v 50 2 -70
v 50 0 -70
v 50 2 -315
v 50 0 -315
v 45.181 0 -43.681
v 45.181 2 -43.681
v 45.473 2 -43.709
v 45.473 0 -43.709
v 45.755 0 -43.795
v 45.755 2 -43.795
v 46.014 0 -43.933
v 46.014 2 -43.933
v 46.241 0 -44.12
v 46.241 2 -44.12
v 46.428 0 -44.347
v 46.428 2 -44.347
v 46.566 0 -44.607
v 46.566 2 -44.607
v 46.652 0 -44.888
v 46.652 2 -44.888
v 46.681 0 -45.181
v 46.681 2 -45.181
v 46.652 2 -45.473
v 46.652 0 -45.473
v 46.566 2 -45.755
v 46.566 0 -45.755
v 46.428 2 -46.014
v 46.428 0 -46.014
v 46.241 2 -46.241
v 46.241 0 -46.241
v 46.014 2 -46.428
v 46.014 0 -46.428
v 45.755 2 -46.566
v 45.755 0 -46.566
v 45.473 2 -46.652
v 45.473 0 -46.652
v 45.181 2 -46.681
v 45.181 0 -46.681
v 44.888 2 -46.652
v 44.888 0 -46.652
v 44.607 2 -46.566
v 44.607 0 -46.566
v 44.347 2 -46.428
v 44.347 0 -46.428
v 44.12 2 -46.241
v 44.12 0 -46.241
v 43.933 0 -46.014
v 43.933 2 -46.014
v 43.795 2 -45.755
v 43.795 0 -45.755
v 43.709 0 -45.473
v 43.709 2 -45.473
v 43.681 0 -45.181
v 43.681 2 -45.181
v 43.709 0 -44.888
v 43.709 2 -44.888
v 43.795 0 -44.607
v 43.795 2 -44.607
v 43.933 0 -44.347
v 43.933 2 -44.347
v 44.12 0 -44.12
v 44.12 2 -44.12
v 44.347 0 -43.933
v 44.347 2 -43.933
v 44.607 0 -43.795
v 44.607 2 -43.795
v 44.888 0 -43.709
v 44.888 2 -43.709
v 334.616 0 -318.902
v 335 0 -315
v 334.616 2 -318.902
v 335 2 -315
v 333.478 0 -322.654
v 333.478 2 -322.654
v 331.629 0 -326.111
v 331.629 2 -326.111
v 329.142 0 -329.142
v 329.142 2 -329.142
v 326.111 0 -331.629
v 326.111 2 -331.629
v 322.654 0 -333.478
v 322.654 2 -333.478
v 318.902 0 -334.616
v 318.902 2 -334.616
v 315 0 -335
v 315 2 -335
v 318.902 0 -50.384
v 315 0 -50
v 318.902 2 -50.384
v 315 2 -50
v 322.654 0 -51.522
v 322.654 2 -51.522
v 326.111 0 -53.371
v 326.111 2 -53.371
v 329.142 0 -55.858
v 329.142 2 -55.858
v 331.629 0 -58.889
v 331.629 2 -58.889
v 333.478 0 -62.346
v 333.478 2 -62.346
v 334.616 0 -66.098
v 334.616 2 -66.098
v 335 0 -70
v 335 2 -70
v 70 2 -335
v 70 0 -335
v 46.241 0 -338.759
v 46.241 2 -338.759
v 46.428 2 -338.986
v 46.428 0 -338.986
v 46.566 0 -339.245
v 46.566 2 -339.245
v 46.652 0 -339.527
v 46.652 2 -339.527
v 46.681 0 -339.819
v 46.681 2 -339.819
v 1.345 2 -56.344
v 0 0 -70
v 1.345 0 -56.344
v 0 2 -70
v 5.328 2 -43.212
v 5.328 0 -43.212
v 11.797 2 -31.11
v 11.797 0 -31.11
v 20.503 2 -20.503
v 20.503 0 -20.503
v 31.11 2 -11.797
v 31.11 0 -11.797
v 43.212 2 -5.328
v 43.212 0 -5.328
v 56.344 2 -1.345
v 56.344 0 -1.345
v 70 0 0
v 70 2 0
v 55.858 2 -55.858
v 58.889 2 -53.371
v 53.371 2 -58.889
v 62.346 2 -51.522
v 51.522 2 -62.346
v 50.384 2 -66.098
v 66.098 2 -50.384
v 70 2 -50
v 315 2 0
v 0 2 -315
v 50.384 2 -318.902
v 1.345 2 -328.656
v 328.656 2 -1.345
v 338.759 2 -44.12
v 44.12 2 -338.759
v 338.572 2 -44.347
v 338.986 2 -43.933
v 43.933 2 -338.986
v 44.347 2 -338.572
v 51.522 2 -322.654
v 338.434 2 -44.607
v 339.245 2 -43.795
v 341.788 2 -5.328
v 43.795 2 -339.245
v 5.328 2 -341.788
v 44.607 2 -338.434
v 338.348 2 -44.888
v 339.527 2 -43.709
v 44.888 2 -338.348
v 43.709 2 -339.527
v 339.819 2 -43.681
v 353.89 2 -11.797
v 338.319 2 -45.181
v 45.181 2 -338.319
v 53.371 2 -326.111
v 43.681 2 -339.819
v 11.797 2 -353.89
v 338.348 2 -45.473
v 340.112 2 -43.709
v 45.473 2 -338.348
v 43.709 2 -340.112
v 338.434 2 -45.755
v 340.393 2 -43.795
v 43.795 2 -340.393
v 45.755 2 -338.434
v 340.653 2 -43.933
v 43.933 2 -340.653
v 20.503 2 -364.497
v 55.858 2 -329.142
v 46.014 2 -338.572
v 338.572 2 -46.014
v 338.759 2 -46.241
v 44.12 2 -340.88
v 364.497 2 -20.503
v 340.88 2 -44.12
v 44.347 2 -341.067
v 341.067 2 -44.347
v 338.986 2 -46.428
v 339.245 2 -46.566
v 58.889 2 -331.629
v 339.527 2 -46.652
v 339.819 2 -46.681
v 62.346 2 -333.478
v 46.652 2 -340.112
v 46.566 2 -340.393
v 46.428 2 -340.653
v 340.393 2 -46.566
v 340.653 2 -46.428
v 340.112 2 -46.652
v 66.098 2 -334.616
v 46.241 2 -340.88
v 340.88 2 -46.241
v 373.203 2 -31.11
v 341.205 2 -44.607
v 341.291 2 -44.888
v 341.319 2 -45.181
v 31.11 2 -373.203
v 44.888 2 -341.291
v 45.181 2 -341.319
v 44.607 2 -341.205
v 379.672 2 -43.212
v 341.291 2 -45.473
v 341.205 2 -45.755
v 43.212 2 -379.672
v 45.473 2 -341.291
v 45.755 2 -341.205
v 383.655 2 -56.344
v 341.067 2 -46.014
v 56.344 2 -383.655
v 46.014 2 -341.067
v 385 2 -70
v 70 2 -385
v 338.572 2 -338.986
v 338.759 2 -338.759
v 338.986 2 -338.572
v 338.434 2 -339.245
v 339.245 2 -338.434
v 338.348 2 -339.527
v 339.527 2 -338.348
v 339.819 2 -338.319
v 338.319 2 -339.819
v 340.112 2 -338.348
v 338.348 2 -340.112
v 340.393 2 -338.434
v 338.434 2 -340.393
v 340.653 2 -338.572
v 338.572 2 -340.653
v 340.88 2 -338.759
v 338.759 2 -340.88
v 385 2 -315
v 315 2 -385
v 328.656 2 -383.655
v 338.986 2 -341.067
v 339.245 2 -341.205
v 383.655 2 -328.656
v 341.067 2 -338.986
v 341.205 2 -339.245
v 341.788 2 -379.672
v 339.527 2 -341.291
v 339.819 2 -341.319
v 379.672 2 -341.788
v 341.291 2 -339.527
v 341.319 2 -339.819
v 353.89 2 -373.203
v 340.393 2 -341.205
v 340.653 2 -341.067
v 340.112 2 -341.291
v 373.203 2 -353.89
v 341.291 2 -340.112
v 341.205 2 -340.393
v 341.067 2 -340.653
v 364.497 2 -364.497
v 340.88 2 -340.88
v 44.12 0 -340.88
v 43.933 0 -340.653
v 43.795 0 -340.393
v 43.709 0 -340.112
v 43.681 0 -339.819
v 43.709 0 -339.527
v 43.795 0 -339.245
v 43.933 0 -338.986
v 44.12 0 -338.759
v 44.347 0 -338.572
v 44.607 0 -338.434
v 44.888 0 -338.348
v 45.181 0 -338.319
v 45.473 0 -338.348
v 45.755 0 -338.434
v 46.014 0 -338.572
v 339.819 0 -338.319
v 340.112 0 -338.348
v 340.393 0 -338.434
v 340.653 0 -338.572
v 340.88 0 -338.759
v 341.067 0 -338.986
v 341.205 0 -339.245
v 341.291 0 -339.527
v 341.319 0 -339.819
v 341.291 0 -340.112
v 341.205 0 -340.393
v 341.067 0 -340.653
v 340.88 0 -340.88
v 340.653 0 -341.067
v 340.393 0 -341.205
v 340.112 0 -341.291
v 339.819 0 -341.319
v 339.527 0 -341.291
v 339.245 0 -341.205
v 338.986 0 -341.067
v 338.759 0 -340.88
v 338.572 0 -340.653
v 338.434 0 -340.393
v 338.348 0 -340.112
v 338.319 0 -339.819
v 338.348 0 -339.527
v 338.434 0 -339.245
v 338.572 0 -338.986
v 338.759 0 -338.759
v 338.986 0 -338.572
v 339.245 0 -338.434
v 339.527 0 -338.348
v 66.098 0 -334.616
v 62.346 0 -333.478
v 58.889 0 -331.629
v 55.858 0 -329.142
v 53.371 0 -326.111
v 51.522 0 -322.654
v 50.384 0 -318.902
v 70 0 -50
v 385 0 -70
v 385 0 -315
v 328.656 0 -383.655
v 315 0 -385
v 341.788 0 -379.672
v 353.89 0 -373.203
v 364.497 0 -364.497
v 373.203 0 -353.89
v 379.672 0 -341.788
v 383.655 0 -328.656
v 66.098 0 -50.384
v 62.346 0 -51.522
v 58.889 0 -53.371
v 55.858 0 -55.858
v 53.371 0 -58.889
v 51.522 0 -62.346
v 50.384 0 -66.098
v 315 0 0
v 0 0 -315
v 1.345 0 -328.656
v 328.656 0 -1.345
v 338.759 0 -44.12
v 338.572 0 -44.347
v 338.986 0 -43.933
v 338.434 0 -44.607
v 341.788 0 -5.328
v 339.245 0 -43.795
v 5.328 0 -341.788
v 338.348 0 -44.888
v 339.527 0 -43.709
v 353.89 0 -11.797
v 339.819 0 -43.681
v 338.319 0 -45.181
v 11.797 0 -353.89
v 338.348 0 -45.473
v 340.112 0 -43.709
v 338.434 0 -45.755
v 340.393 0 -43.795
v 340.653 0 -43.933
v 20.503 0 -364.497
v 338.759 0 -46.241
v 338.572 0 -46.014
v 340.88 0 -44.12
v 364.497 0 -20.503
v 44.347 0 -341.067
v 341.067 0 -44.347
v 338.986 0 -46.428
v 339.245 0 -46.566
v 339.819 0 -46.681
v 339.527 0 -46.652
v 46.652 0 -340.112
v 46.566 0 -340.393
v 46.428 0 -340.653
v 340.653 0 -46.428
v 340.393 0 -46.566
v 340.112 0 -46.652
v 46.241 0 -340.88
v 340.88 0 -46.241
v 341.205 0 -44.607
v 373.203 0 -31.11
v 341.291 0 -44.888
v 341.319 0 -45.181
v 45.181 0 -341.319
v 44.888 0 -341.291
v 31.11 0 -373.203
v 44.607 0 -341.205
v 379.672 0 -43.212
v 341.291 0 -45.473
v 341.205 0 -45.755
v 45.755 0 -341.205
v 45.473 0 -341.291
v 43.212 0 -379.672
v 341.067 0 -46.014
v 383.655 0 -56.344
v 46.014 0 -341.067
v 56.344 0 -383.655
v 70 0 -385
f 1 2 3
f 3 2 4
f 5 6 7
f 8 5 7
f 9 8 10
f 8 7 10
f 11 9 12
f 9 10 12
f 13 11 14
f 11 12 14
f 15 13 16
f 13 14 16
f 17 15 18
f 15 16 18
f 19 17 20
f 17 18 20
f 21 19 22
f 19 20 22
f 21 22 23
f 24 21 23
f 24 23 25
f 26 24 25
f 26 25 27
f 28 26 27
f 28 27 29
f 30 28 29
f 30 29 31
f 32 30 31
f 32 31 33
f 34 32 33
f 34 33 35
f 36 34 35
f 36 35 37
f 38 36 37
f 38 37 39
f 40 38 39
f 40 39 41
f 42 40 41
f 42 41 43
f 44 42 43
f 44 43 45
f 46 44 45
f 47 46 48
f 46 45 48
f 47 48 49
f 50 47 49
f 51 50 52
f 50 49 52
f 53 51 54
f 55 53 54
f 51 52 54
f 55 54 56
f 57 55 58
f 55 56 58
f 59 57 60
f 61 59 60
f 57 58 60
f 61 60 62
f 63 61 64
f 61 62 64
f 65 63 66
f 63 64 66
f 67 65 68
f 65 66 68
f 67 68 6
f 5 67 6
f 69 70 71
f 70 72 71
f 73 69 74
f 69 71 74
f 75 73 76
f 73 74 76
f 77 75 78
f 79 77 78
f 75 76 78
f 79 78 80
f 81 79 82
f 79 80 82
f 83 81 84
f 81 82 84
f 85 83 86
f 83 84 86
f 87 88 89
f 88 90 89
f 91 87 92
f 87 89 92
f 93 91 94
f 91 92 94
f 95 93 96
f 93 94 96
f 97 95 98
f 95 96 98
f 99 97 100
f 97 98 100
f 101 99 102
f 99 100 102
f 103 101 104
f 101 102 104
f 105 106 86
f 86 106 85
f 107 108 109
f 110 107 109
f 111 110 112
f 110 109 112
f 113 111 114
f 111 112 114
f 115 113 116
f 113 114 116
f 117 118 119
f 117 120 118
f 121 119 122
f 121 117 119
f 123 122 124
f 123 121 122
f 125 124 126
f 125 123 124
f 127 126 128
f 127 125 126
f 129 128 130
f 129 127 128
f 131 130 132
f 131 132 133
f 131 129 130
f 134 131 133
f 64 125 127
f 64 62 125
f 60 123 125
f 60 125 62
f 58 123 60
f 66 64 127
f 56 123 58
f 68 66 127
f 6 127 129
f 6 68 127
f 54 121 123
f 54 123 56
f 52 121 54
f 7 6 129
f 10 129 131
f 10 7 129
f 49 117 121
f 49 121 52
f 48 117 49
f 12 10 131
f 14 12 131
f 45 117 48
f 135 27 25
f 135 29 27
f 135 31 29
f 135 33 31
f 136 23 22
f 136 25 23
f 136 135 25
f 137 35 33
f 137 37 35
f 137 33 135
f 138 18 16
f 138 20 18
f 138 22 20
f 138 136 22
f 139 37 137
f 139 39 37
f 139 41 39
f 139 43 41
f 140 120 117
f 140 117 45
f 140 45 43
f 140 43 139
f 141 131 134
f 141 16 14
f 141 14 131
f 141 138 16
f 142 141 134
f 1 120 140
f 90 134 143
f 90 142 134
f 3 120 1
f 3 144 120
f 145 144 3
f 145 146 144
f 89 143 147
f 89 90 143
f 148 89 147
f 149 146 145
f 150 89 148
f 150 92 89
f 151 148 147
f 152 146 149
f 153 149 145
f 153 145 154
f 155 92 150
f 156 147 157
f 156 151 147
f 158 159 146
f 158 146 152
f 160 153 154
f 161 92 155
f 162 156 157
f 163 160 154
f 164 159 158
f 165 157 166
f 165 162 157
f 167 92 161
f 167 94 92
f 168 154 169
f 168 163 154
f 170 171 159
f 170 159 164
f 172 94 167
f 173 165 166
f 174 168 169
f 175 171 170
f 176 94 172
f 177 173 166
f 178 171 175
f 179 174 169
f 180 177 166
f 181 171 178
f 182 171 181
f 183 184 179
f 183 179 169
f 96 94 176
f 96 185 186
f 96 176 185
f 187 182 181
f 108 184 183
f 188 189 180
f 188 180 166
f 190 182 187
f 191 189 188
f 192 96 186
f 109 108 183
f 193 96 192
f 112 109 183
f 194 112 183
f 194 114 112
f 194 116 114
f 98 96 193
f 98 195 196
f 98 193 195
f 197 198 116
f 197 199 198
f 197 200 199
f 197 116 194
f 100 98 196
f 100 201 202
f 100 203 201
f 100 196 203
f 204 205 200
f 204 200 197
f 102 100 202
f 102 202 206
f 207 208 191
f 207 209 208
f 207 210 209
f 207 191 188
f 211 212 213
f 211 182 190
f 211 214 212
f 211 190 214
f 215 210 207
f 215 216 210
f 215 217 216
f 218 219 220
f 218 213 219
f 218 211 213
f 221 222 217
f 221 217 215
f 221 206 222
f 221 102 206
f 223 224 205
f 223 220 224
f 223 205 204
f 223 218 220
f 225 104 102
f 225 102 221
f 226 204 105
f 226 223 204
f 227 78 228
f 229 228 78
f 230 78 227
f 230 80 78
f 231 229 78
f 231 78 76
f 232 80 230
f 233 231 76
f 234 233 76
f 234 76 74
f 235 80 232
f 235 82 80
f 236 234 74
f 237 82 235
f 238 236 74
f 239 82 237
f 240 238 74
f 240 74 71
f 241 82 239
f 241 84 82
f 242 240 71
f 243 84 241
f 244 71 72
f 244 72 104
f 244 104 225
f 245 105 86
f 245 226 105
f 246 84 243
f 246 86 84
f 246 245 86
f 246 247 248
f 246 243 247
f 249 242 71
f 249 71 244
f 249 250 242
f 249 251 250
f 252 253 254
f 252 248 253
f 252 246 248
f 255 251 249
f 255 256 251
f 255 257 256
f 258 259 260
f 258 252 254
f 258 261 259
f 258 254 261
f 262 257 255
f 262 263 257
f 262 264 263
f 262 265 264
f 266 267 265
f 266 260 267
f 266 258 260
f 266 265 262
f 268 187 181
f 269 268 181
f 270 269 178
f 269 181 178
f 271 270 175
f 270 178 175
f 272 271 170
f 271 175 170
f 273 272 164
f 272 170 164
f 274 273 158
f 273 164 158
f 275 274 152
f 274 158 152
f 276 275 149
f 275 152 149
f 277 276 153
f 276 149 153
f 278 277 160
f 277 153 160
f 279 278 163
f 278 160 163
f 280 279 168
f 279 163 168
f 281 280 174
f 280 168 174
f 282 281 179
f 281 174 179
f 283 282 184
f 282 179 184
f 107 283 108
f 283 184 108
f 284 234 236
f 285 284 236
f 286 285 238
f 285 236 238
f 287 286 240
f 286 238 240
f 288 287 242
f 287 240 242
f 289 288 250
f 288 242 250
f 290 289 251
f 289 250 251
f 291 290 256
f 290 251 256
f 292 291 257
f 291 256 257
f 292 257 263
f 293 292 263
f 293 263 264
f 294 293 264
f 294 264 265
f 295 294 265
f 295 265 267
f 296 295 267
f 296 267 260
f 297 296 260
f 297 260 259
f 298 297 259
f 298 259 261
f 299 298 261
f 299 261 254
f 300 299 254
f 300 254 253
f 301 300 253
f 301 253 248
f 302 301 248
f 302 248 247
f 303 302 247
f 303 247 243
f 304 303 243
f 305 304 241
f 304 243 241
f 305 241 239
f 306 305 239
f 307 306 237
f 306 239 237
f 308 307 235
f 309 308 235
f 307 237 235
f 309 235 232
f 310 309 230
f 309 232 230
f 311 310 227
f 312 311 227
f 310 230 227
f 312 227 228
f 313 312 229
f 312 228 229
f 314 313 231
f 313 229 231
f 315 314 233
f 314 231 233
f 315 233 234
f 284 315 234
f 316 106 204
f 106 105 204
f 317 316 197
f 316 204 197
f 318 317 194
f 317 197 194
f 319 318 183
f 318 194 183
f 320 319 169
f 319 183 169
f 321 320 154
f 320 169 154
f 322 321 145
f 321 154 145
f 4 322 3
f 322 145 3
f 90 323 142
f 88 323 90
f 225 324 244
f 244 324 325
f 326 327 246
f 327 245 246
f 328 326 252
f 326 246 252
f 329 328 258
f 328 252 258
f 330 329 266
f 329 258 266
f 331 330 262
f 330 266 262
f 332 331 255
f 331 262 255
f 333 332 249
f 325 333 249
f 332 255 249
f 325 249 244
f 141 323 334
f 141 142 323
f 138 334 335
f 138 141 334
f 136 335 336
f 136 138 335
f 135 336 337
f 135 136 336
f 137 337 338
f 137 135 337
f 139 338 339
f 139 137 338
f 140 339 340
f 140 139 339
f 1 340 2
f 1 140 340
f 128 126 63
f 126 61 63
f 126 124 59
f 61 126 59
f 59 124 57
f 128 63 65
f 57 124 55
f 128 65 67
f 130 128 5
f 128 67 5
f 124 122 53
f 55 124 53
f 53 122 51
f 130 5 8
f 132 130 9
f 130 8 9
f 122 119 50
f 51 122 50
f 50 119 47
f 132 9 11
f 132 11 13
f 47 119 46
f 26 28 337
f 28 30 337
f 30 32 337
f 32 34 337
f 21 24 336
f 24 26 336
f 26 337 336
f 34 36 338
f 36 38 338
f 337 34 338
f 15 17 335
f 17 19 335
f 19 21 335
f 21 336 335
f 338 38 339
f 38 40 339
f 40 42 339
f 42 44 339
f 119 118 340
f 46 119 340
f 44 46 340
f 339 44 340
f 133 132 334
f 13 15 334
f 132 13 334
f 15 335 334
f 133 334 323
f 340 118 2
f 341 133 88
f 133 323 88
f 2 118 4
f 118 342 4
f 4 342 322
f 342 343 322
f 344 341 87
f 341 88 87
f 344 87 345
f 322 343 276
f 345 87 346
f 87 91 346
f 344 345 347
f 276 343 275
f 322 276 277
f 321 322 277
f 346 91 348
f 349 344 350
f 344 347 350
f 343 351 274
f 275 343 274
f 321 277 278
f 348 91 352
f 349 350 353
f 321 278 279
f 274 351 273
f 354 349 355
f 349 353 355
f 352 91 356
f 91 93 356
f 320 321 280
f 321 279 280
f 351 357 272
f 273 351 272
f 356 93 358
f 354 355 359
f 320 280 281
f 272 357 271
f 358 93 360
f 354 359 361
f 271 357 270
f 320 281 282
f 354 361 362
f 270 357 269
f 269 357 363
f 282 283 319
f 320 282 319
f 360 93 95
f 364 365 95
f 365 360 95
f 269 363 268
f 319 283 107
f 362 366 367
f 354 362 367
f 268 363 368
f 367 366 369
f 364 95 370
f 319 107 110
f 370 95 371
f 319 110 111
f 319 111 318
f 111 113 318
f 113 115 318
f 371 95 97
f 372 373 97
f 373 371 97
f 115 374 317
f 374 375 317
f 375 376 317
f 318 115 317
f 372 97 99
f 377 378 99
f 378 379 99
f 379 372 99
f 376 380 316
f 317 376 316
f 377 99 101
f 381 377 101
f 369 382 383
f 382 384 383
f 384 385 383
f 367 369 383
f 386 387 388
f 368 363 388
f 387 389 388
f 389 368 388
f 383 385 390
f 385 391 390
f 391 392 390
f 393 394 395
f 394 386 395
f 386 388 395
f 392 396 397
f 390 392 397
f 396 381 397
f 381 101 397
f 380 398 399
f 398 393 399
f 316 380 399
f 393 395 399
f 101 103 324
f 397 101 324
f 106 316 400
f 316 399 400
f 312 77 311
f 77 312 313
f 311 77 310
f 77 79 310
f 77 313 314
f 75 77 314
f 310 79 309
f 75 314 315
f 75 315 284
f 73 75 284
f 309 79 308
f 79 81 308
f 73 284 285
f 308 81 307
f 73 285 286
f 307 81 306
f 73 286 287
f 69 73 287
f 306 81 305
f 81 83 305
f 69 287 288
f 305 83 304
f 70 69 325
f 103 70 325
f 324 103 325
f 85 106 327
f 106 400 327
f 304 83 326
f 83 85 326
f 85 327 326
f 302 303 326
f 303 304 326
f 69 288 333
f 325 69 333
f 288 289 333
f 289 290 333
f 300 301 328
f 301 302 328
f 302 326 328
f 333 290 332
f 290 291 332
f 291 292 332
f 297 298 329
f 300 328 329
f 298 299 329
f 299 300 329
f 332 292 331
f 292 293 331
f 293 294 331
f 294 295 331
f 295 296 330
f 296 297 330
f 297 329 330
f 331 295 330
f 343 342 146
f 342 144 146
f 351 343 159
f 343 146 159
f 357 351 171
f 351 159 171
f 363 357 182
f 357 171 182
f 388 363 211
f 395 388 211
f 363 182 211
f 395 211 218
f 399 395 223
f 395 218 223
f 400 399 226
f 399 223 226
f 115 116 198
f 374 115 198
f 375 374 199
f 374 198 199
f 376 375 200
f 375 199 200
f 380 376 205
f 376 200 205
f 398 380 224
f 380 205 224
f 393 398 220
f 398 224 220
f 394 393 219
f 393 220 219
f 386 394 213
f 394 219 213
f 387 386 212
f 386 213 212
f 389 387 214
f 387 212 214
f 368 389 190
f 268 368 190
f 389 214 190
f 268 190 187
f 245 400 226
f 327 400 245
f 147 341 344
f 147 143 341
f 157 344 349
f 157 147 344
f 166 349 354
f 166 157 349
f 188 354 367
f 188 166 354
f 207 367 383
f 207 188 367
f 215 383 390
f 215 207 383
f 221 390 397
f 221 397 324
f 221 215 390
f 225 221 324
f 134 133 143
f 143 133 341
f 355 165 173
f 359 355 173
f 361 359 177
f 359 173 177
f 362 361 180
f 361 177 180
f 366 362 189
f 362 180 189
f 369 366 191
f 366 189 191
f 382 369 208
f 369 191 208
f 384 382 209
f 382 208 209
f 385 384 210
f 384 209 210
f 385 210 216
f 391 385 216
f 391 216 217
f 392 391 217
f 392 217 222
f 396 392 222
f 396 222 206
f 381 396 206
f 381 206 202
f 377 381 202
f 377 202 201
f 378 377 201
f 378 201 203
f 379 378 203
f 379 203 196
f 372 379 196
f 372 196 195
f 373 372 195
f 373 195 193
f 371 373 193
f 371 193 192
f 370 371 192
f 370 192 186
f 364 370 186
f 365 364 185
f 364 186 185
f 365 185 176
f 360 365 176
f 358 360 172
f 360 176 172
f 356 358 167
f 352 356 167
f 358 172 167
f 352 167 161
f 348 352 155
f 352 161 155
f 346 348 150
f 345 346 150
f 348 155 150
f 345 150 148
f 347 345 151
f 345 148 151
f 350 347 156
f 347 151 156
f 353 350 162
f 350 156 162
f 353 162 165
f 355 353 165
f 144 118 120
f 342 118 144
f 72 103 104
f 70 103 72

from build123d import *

# Parameters (mm, degrees)
SKETCH_1_W          = 385
SKETCH_1_H          = 385
SKETCH_1_W_2        = 285
SKETCH_1_H_2        = 285
EXTRUDE_1_DEPTH     = 2
FILLET_1_R          = 70
FILLET_2_R          = 20
CUT_EXTRUDE_1_REACH = 546.476
SKETCH_2_R          = 1.5


with BuildPart() as part:
    # 草图1 → 凸台-拉伸1 (new body)
    with BuildSketch(Plane(origin=(0, 0, 0), x_dir=(1, 0, 0), z_dir=(0, 1, 0))):
        with Locations((192.5, 192.5)):
            Rectangle(SKETCH_1_W, SKETCH_1_H)
        with Locations((192.5, 192.5)):
            Rectangle(SKETCH_1_W_2, SKETCH_1_H_2, mode=Mode.SUBTRACT)
    extrude(amount=EXTRUDE_1_DEPTH)

    # 圆角1
    fillet_1_edges = [part.edges().sort_by_distance(p)[0] for p in [
        (0, 1, -385),
        (385, 1, -385),
        (385, 1, 0),
        (0, 1, 0),
    ]]
    fillet(fillet_1_edges, radius=FILLET_1_R)

    # 圆角2
    fillet_2_edges = [part.edges().sort_by_distance(p)[0] for p in [
        (50, 1, -335),
        (50, 1, -50),
        (335, 1, -50),
        (335, 1, -335),
    ]]
    fillet(fillet_2_edges, radius=FILLET_2_R)

    # 草图2 → 切除-拉伸1 (cut, up to next)
    with BuildSketch(Plane(origin=(0, 2, 0), x_dir=(1, 0, 0), z_dir=(0, 1, 0)), mode=Mode.PRIVATE) as cut_extrude_1_sk1:
        with Locations(Location((45.18055198, 45.18055198, 0), (0, 0, 270))):
            Circle(SKETCH_2_R)
    cut_extrude_1_tool1 = extrude(cut_extrude_1_sk1.sketch, amount=-CUT_EXTRUDE_1_REACH, mode=Mode.PRIVATE) & part.part
    # 草图2 → 切除-拉伸1 (cut, up to next)
    with BuildSketch(Plane(origin=(0, 2, 0), x_dir=(1, 0, 0), z_dir=(0, 1, 0)), mode=Mode.PRIVATE) as cut_extrude_1_sk2:
        with BuildLine():
            ThreePointArc((46.68055198, 339.81944802), (45.754577129, 341.205267318), (44.119891809, 340.880108191))
            Line((44.119891809, 340.880108191), (46.241212152, 338.758787848))
            ThreePointArc((46.241212152, 338.758787848), (46.566371279, 339.245422871), (46.68055198, 339.81944802))
        make_face()
    cut_extrude_1_tool2 = extrude(cut_extrude_1_sk2.sketch, amount=-CUT_EXTRUDE_1_REACH, mode=Mode.PRIVATE) & part.part
    # 草图2 → 切除-拉伸1 (cut, up to next)
    with BuildSketch(Plane(origin=(0, 2, 0), x_dir=(1, 0, 0), z_dir=(0, 1, 0)), mode=Mode.PRIVATE) as cut_extrude_1_sk3:
        with BuildLine():
            Line((46.241212152, 338.758787848), (44.119891809, 340.880108191))
            ThreePointArc((44.119891809, 340.880108191), (44.119891809, 338.758787848), (46.241212152, 338.758787848))
        make_face()
    cut_extrude_1_tool3 = extrude(cut_extrude_1_sk3.sketch, amount=-CUT_EXTRUDE_1_REACH, mode=Mode.PRIVATE) & part.part
    # 草图2 → 切除-拉伸1 (cut, up to next)
    with BuildSketch(Plane(origin=(0, 2, 0), x_dir=(1, 0, 0), z_dir=(0, 1, 0)), mode=Mode.PRIVATE) as cut_extrude_1_sk4:
        with BuildLine():
            ThreePointArc((46.68055198, 339.81944802), (45.754577129, 341.205267318), (44.119891809, 340.880108191))
            Line((44.119891809, 340.880108191), (46.241212152, 338.758787848))
            ThreePointArc((46.241212152, 338.758787848), (46.566371279, 339.245422871), (46.68055198, 339.81944802))
        make_face()
    cut_extrude_1_tool4 = extrude(cut_extrude_1_sk4.sketch, amount=-CUT_EXTRUDE_1_REACH, mode=Mode.PRIVATE) & part.part
    # 草图2 → 切除-拉伸1 (cut, up to next)
    with BuildSketch(Plane(origin=(0, 2, 0), x_dir=(1, 0, 0), z_dir=(0, 1, 0)), mode=Mode.PRIVATE) as cut_extrude_1_sk5:
        with BuildLine():
            Line((46.241212152, 338.758787848), (44.119891809, 340.880108191))
            ThreePointArc((44.119891809, 340.880108191), (44.119891809, 338.758787848), (46.241212152, 338.758787848))
        make_face()
    cut_extrude_1_tool5 = extrude(cut_extrude_1_sk5.sketch, amount=-CUT_EXTRUDE_1_REACH, mode=Mode.PRIVATE) & part.part
    # 草图2 → 切除-拉伸1 (cut, up to next)
    with BuildSketch(Plane(origin=(0, 2, 0), x_dir=(1, 0, 0), z_dir=(0, 1, 0)), mode=Mode.PRIVATE) as cut_extrude_1_sk6:
        with Locations(Location((339.81944802, 339.81944802, 0), (0, 0, 270))):
            Circle(SKETCH_2_R)
    cut_extrude_1_tool6 = extrude(cut_extrude_1_sk6.sketch, amount=-CUT_EXTRUDE_1_REACH, mode=Mode.PRIVATE) & part.part
    # 草图2 → 切除-拉伸1 (cut, up to next)
    with BuildSketch(Plane(origin=(0, 2, 0), x_dir=(1, 0, 0), z_dir=(0, 1, 0)), mode=Mode.PRIVATE) as cut_extrude_1_sk7:
        with Locations(Location((339.81944802, 45.18055198, 0), (0, 0, 270))):
            Circle(SKETCH_2_R)
    cut_extrude_1_tool7 = extrude(cut_extrude_1_sk7.sketch, amount=-CUT_EXTRUDE_1_REACH, mode=Mode.PRIVATE) & part.part
    add(cut_extrude_1_tool1.solids().sort_by_distance((45.180552, 2, -45.180552))[0], mode=Mode.SUBTRACT)
    add(cut_extrude_1_tool2.solids().sort_by_distance((45.63071, 2, -340.269606))[0], mode=Mode.SUBTRACT)
    add(cut_extrude_1_tool3.solids().sort_by_distance((44.730394, 2, -339.36929))[0], mode=Mode.SUBTRACT)
    add(cut_extrude_1_tool4.solids().sort_by_distance((45.63071, 2, -340.269606))[0], mode=Mode.SUBTRACT)
    add(cut_extrude_1_tool5.solids().sort_by_distance((44.730394, 2, -339.36929))[0], mode=Mode.SUBTRACT)
    add(cut_extrude_1_tool6.solids().sort_by_distance((339.819448, 2, -339.819448))[0], mode=Mode.SUBTRACT)
    add(cut_extrude_1_tool7.solids().sort_by_distance((339.819448, 2, -45.180552))[0], mode=Mode.SUBTRACT)


solid = part.part
